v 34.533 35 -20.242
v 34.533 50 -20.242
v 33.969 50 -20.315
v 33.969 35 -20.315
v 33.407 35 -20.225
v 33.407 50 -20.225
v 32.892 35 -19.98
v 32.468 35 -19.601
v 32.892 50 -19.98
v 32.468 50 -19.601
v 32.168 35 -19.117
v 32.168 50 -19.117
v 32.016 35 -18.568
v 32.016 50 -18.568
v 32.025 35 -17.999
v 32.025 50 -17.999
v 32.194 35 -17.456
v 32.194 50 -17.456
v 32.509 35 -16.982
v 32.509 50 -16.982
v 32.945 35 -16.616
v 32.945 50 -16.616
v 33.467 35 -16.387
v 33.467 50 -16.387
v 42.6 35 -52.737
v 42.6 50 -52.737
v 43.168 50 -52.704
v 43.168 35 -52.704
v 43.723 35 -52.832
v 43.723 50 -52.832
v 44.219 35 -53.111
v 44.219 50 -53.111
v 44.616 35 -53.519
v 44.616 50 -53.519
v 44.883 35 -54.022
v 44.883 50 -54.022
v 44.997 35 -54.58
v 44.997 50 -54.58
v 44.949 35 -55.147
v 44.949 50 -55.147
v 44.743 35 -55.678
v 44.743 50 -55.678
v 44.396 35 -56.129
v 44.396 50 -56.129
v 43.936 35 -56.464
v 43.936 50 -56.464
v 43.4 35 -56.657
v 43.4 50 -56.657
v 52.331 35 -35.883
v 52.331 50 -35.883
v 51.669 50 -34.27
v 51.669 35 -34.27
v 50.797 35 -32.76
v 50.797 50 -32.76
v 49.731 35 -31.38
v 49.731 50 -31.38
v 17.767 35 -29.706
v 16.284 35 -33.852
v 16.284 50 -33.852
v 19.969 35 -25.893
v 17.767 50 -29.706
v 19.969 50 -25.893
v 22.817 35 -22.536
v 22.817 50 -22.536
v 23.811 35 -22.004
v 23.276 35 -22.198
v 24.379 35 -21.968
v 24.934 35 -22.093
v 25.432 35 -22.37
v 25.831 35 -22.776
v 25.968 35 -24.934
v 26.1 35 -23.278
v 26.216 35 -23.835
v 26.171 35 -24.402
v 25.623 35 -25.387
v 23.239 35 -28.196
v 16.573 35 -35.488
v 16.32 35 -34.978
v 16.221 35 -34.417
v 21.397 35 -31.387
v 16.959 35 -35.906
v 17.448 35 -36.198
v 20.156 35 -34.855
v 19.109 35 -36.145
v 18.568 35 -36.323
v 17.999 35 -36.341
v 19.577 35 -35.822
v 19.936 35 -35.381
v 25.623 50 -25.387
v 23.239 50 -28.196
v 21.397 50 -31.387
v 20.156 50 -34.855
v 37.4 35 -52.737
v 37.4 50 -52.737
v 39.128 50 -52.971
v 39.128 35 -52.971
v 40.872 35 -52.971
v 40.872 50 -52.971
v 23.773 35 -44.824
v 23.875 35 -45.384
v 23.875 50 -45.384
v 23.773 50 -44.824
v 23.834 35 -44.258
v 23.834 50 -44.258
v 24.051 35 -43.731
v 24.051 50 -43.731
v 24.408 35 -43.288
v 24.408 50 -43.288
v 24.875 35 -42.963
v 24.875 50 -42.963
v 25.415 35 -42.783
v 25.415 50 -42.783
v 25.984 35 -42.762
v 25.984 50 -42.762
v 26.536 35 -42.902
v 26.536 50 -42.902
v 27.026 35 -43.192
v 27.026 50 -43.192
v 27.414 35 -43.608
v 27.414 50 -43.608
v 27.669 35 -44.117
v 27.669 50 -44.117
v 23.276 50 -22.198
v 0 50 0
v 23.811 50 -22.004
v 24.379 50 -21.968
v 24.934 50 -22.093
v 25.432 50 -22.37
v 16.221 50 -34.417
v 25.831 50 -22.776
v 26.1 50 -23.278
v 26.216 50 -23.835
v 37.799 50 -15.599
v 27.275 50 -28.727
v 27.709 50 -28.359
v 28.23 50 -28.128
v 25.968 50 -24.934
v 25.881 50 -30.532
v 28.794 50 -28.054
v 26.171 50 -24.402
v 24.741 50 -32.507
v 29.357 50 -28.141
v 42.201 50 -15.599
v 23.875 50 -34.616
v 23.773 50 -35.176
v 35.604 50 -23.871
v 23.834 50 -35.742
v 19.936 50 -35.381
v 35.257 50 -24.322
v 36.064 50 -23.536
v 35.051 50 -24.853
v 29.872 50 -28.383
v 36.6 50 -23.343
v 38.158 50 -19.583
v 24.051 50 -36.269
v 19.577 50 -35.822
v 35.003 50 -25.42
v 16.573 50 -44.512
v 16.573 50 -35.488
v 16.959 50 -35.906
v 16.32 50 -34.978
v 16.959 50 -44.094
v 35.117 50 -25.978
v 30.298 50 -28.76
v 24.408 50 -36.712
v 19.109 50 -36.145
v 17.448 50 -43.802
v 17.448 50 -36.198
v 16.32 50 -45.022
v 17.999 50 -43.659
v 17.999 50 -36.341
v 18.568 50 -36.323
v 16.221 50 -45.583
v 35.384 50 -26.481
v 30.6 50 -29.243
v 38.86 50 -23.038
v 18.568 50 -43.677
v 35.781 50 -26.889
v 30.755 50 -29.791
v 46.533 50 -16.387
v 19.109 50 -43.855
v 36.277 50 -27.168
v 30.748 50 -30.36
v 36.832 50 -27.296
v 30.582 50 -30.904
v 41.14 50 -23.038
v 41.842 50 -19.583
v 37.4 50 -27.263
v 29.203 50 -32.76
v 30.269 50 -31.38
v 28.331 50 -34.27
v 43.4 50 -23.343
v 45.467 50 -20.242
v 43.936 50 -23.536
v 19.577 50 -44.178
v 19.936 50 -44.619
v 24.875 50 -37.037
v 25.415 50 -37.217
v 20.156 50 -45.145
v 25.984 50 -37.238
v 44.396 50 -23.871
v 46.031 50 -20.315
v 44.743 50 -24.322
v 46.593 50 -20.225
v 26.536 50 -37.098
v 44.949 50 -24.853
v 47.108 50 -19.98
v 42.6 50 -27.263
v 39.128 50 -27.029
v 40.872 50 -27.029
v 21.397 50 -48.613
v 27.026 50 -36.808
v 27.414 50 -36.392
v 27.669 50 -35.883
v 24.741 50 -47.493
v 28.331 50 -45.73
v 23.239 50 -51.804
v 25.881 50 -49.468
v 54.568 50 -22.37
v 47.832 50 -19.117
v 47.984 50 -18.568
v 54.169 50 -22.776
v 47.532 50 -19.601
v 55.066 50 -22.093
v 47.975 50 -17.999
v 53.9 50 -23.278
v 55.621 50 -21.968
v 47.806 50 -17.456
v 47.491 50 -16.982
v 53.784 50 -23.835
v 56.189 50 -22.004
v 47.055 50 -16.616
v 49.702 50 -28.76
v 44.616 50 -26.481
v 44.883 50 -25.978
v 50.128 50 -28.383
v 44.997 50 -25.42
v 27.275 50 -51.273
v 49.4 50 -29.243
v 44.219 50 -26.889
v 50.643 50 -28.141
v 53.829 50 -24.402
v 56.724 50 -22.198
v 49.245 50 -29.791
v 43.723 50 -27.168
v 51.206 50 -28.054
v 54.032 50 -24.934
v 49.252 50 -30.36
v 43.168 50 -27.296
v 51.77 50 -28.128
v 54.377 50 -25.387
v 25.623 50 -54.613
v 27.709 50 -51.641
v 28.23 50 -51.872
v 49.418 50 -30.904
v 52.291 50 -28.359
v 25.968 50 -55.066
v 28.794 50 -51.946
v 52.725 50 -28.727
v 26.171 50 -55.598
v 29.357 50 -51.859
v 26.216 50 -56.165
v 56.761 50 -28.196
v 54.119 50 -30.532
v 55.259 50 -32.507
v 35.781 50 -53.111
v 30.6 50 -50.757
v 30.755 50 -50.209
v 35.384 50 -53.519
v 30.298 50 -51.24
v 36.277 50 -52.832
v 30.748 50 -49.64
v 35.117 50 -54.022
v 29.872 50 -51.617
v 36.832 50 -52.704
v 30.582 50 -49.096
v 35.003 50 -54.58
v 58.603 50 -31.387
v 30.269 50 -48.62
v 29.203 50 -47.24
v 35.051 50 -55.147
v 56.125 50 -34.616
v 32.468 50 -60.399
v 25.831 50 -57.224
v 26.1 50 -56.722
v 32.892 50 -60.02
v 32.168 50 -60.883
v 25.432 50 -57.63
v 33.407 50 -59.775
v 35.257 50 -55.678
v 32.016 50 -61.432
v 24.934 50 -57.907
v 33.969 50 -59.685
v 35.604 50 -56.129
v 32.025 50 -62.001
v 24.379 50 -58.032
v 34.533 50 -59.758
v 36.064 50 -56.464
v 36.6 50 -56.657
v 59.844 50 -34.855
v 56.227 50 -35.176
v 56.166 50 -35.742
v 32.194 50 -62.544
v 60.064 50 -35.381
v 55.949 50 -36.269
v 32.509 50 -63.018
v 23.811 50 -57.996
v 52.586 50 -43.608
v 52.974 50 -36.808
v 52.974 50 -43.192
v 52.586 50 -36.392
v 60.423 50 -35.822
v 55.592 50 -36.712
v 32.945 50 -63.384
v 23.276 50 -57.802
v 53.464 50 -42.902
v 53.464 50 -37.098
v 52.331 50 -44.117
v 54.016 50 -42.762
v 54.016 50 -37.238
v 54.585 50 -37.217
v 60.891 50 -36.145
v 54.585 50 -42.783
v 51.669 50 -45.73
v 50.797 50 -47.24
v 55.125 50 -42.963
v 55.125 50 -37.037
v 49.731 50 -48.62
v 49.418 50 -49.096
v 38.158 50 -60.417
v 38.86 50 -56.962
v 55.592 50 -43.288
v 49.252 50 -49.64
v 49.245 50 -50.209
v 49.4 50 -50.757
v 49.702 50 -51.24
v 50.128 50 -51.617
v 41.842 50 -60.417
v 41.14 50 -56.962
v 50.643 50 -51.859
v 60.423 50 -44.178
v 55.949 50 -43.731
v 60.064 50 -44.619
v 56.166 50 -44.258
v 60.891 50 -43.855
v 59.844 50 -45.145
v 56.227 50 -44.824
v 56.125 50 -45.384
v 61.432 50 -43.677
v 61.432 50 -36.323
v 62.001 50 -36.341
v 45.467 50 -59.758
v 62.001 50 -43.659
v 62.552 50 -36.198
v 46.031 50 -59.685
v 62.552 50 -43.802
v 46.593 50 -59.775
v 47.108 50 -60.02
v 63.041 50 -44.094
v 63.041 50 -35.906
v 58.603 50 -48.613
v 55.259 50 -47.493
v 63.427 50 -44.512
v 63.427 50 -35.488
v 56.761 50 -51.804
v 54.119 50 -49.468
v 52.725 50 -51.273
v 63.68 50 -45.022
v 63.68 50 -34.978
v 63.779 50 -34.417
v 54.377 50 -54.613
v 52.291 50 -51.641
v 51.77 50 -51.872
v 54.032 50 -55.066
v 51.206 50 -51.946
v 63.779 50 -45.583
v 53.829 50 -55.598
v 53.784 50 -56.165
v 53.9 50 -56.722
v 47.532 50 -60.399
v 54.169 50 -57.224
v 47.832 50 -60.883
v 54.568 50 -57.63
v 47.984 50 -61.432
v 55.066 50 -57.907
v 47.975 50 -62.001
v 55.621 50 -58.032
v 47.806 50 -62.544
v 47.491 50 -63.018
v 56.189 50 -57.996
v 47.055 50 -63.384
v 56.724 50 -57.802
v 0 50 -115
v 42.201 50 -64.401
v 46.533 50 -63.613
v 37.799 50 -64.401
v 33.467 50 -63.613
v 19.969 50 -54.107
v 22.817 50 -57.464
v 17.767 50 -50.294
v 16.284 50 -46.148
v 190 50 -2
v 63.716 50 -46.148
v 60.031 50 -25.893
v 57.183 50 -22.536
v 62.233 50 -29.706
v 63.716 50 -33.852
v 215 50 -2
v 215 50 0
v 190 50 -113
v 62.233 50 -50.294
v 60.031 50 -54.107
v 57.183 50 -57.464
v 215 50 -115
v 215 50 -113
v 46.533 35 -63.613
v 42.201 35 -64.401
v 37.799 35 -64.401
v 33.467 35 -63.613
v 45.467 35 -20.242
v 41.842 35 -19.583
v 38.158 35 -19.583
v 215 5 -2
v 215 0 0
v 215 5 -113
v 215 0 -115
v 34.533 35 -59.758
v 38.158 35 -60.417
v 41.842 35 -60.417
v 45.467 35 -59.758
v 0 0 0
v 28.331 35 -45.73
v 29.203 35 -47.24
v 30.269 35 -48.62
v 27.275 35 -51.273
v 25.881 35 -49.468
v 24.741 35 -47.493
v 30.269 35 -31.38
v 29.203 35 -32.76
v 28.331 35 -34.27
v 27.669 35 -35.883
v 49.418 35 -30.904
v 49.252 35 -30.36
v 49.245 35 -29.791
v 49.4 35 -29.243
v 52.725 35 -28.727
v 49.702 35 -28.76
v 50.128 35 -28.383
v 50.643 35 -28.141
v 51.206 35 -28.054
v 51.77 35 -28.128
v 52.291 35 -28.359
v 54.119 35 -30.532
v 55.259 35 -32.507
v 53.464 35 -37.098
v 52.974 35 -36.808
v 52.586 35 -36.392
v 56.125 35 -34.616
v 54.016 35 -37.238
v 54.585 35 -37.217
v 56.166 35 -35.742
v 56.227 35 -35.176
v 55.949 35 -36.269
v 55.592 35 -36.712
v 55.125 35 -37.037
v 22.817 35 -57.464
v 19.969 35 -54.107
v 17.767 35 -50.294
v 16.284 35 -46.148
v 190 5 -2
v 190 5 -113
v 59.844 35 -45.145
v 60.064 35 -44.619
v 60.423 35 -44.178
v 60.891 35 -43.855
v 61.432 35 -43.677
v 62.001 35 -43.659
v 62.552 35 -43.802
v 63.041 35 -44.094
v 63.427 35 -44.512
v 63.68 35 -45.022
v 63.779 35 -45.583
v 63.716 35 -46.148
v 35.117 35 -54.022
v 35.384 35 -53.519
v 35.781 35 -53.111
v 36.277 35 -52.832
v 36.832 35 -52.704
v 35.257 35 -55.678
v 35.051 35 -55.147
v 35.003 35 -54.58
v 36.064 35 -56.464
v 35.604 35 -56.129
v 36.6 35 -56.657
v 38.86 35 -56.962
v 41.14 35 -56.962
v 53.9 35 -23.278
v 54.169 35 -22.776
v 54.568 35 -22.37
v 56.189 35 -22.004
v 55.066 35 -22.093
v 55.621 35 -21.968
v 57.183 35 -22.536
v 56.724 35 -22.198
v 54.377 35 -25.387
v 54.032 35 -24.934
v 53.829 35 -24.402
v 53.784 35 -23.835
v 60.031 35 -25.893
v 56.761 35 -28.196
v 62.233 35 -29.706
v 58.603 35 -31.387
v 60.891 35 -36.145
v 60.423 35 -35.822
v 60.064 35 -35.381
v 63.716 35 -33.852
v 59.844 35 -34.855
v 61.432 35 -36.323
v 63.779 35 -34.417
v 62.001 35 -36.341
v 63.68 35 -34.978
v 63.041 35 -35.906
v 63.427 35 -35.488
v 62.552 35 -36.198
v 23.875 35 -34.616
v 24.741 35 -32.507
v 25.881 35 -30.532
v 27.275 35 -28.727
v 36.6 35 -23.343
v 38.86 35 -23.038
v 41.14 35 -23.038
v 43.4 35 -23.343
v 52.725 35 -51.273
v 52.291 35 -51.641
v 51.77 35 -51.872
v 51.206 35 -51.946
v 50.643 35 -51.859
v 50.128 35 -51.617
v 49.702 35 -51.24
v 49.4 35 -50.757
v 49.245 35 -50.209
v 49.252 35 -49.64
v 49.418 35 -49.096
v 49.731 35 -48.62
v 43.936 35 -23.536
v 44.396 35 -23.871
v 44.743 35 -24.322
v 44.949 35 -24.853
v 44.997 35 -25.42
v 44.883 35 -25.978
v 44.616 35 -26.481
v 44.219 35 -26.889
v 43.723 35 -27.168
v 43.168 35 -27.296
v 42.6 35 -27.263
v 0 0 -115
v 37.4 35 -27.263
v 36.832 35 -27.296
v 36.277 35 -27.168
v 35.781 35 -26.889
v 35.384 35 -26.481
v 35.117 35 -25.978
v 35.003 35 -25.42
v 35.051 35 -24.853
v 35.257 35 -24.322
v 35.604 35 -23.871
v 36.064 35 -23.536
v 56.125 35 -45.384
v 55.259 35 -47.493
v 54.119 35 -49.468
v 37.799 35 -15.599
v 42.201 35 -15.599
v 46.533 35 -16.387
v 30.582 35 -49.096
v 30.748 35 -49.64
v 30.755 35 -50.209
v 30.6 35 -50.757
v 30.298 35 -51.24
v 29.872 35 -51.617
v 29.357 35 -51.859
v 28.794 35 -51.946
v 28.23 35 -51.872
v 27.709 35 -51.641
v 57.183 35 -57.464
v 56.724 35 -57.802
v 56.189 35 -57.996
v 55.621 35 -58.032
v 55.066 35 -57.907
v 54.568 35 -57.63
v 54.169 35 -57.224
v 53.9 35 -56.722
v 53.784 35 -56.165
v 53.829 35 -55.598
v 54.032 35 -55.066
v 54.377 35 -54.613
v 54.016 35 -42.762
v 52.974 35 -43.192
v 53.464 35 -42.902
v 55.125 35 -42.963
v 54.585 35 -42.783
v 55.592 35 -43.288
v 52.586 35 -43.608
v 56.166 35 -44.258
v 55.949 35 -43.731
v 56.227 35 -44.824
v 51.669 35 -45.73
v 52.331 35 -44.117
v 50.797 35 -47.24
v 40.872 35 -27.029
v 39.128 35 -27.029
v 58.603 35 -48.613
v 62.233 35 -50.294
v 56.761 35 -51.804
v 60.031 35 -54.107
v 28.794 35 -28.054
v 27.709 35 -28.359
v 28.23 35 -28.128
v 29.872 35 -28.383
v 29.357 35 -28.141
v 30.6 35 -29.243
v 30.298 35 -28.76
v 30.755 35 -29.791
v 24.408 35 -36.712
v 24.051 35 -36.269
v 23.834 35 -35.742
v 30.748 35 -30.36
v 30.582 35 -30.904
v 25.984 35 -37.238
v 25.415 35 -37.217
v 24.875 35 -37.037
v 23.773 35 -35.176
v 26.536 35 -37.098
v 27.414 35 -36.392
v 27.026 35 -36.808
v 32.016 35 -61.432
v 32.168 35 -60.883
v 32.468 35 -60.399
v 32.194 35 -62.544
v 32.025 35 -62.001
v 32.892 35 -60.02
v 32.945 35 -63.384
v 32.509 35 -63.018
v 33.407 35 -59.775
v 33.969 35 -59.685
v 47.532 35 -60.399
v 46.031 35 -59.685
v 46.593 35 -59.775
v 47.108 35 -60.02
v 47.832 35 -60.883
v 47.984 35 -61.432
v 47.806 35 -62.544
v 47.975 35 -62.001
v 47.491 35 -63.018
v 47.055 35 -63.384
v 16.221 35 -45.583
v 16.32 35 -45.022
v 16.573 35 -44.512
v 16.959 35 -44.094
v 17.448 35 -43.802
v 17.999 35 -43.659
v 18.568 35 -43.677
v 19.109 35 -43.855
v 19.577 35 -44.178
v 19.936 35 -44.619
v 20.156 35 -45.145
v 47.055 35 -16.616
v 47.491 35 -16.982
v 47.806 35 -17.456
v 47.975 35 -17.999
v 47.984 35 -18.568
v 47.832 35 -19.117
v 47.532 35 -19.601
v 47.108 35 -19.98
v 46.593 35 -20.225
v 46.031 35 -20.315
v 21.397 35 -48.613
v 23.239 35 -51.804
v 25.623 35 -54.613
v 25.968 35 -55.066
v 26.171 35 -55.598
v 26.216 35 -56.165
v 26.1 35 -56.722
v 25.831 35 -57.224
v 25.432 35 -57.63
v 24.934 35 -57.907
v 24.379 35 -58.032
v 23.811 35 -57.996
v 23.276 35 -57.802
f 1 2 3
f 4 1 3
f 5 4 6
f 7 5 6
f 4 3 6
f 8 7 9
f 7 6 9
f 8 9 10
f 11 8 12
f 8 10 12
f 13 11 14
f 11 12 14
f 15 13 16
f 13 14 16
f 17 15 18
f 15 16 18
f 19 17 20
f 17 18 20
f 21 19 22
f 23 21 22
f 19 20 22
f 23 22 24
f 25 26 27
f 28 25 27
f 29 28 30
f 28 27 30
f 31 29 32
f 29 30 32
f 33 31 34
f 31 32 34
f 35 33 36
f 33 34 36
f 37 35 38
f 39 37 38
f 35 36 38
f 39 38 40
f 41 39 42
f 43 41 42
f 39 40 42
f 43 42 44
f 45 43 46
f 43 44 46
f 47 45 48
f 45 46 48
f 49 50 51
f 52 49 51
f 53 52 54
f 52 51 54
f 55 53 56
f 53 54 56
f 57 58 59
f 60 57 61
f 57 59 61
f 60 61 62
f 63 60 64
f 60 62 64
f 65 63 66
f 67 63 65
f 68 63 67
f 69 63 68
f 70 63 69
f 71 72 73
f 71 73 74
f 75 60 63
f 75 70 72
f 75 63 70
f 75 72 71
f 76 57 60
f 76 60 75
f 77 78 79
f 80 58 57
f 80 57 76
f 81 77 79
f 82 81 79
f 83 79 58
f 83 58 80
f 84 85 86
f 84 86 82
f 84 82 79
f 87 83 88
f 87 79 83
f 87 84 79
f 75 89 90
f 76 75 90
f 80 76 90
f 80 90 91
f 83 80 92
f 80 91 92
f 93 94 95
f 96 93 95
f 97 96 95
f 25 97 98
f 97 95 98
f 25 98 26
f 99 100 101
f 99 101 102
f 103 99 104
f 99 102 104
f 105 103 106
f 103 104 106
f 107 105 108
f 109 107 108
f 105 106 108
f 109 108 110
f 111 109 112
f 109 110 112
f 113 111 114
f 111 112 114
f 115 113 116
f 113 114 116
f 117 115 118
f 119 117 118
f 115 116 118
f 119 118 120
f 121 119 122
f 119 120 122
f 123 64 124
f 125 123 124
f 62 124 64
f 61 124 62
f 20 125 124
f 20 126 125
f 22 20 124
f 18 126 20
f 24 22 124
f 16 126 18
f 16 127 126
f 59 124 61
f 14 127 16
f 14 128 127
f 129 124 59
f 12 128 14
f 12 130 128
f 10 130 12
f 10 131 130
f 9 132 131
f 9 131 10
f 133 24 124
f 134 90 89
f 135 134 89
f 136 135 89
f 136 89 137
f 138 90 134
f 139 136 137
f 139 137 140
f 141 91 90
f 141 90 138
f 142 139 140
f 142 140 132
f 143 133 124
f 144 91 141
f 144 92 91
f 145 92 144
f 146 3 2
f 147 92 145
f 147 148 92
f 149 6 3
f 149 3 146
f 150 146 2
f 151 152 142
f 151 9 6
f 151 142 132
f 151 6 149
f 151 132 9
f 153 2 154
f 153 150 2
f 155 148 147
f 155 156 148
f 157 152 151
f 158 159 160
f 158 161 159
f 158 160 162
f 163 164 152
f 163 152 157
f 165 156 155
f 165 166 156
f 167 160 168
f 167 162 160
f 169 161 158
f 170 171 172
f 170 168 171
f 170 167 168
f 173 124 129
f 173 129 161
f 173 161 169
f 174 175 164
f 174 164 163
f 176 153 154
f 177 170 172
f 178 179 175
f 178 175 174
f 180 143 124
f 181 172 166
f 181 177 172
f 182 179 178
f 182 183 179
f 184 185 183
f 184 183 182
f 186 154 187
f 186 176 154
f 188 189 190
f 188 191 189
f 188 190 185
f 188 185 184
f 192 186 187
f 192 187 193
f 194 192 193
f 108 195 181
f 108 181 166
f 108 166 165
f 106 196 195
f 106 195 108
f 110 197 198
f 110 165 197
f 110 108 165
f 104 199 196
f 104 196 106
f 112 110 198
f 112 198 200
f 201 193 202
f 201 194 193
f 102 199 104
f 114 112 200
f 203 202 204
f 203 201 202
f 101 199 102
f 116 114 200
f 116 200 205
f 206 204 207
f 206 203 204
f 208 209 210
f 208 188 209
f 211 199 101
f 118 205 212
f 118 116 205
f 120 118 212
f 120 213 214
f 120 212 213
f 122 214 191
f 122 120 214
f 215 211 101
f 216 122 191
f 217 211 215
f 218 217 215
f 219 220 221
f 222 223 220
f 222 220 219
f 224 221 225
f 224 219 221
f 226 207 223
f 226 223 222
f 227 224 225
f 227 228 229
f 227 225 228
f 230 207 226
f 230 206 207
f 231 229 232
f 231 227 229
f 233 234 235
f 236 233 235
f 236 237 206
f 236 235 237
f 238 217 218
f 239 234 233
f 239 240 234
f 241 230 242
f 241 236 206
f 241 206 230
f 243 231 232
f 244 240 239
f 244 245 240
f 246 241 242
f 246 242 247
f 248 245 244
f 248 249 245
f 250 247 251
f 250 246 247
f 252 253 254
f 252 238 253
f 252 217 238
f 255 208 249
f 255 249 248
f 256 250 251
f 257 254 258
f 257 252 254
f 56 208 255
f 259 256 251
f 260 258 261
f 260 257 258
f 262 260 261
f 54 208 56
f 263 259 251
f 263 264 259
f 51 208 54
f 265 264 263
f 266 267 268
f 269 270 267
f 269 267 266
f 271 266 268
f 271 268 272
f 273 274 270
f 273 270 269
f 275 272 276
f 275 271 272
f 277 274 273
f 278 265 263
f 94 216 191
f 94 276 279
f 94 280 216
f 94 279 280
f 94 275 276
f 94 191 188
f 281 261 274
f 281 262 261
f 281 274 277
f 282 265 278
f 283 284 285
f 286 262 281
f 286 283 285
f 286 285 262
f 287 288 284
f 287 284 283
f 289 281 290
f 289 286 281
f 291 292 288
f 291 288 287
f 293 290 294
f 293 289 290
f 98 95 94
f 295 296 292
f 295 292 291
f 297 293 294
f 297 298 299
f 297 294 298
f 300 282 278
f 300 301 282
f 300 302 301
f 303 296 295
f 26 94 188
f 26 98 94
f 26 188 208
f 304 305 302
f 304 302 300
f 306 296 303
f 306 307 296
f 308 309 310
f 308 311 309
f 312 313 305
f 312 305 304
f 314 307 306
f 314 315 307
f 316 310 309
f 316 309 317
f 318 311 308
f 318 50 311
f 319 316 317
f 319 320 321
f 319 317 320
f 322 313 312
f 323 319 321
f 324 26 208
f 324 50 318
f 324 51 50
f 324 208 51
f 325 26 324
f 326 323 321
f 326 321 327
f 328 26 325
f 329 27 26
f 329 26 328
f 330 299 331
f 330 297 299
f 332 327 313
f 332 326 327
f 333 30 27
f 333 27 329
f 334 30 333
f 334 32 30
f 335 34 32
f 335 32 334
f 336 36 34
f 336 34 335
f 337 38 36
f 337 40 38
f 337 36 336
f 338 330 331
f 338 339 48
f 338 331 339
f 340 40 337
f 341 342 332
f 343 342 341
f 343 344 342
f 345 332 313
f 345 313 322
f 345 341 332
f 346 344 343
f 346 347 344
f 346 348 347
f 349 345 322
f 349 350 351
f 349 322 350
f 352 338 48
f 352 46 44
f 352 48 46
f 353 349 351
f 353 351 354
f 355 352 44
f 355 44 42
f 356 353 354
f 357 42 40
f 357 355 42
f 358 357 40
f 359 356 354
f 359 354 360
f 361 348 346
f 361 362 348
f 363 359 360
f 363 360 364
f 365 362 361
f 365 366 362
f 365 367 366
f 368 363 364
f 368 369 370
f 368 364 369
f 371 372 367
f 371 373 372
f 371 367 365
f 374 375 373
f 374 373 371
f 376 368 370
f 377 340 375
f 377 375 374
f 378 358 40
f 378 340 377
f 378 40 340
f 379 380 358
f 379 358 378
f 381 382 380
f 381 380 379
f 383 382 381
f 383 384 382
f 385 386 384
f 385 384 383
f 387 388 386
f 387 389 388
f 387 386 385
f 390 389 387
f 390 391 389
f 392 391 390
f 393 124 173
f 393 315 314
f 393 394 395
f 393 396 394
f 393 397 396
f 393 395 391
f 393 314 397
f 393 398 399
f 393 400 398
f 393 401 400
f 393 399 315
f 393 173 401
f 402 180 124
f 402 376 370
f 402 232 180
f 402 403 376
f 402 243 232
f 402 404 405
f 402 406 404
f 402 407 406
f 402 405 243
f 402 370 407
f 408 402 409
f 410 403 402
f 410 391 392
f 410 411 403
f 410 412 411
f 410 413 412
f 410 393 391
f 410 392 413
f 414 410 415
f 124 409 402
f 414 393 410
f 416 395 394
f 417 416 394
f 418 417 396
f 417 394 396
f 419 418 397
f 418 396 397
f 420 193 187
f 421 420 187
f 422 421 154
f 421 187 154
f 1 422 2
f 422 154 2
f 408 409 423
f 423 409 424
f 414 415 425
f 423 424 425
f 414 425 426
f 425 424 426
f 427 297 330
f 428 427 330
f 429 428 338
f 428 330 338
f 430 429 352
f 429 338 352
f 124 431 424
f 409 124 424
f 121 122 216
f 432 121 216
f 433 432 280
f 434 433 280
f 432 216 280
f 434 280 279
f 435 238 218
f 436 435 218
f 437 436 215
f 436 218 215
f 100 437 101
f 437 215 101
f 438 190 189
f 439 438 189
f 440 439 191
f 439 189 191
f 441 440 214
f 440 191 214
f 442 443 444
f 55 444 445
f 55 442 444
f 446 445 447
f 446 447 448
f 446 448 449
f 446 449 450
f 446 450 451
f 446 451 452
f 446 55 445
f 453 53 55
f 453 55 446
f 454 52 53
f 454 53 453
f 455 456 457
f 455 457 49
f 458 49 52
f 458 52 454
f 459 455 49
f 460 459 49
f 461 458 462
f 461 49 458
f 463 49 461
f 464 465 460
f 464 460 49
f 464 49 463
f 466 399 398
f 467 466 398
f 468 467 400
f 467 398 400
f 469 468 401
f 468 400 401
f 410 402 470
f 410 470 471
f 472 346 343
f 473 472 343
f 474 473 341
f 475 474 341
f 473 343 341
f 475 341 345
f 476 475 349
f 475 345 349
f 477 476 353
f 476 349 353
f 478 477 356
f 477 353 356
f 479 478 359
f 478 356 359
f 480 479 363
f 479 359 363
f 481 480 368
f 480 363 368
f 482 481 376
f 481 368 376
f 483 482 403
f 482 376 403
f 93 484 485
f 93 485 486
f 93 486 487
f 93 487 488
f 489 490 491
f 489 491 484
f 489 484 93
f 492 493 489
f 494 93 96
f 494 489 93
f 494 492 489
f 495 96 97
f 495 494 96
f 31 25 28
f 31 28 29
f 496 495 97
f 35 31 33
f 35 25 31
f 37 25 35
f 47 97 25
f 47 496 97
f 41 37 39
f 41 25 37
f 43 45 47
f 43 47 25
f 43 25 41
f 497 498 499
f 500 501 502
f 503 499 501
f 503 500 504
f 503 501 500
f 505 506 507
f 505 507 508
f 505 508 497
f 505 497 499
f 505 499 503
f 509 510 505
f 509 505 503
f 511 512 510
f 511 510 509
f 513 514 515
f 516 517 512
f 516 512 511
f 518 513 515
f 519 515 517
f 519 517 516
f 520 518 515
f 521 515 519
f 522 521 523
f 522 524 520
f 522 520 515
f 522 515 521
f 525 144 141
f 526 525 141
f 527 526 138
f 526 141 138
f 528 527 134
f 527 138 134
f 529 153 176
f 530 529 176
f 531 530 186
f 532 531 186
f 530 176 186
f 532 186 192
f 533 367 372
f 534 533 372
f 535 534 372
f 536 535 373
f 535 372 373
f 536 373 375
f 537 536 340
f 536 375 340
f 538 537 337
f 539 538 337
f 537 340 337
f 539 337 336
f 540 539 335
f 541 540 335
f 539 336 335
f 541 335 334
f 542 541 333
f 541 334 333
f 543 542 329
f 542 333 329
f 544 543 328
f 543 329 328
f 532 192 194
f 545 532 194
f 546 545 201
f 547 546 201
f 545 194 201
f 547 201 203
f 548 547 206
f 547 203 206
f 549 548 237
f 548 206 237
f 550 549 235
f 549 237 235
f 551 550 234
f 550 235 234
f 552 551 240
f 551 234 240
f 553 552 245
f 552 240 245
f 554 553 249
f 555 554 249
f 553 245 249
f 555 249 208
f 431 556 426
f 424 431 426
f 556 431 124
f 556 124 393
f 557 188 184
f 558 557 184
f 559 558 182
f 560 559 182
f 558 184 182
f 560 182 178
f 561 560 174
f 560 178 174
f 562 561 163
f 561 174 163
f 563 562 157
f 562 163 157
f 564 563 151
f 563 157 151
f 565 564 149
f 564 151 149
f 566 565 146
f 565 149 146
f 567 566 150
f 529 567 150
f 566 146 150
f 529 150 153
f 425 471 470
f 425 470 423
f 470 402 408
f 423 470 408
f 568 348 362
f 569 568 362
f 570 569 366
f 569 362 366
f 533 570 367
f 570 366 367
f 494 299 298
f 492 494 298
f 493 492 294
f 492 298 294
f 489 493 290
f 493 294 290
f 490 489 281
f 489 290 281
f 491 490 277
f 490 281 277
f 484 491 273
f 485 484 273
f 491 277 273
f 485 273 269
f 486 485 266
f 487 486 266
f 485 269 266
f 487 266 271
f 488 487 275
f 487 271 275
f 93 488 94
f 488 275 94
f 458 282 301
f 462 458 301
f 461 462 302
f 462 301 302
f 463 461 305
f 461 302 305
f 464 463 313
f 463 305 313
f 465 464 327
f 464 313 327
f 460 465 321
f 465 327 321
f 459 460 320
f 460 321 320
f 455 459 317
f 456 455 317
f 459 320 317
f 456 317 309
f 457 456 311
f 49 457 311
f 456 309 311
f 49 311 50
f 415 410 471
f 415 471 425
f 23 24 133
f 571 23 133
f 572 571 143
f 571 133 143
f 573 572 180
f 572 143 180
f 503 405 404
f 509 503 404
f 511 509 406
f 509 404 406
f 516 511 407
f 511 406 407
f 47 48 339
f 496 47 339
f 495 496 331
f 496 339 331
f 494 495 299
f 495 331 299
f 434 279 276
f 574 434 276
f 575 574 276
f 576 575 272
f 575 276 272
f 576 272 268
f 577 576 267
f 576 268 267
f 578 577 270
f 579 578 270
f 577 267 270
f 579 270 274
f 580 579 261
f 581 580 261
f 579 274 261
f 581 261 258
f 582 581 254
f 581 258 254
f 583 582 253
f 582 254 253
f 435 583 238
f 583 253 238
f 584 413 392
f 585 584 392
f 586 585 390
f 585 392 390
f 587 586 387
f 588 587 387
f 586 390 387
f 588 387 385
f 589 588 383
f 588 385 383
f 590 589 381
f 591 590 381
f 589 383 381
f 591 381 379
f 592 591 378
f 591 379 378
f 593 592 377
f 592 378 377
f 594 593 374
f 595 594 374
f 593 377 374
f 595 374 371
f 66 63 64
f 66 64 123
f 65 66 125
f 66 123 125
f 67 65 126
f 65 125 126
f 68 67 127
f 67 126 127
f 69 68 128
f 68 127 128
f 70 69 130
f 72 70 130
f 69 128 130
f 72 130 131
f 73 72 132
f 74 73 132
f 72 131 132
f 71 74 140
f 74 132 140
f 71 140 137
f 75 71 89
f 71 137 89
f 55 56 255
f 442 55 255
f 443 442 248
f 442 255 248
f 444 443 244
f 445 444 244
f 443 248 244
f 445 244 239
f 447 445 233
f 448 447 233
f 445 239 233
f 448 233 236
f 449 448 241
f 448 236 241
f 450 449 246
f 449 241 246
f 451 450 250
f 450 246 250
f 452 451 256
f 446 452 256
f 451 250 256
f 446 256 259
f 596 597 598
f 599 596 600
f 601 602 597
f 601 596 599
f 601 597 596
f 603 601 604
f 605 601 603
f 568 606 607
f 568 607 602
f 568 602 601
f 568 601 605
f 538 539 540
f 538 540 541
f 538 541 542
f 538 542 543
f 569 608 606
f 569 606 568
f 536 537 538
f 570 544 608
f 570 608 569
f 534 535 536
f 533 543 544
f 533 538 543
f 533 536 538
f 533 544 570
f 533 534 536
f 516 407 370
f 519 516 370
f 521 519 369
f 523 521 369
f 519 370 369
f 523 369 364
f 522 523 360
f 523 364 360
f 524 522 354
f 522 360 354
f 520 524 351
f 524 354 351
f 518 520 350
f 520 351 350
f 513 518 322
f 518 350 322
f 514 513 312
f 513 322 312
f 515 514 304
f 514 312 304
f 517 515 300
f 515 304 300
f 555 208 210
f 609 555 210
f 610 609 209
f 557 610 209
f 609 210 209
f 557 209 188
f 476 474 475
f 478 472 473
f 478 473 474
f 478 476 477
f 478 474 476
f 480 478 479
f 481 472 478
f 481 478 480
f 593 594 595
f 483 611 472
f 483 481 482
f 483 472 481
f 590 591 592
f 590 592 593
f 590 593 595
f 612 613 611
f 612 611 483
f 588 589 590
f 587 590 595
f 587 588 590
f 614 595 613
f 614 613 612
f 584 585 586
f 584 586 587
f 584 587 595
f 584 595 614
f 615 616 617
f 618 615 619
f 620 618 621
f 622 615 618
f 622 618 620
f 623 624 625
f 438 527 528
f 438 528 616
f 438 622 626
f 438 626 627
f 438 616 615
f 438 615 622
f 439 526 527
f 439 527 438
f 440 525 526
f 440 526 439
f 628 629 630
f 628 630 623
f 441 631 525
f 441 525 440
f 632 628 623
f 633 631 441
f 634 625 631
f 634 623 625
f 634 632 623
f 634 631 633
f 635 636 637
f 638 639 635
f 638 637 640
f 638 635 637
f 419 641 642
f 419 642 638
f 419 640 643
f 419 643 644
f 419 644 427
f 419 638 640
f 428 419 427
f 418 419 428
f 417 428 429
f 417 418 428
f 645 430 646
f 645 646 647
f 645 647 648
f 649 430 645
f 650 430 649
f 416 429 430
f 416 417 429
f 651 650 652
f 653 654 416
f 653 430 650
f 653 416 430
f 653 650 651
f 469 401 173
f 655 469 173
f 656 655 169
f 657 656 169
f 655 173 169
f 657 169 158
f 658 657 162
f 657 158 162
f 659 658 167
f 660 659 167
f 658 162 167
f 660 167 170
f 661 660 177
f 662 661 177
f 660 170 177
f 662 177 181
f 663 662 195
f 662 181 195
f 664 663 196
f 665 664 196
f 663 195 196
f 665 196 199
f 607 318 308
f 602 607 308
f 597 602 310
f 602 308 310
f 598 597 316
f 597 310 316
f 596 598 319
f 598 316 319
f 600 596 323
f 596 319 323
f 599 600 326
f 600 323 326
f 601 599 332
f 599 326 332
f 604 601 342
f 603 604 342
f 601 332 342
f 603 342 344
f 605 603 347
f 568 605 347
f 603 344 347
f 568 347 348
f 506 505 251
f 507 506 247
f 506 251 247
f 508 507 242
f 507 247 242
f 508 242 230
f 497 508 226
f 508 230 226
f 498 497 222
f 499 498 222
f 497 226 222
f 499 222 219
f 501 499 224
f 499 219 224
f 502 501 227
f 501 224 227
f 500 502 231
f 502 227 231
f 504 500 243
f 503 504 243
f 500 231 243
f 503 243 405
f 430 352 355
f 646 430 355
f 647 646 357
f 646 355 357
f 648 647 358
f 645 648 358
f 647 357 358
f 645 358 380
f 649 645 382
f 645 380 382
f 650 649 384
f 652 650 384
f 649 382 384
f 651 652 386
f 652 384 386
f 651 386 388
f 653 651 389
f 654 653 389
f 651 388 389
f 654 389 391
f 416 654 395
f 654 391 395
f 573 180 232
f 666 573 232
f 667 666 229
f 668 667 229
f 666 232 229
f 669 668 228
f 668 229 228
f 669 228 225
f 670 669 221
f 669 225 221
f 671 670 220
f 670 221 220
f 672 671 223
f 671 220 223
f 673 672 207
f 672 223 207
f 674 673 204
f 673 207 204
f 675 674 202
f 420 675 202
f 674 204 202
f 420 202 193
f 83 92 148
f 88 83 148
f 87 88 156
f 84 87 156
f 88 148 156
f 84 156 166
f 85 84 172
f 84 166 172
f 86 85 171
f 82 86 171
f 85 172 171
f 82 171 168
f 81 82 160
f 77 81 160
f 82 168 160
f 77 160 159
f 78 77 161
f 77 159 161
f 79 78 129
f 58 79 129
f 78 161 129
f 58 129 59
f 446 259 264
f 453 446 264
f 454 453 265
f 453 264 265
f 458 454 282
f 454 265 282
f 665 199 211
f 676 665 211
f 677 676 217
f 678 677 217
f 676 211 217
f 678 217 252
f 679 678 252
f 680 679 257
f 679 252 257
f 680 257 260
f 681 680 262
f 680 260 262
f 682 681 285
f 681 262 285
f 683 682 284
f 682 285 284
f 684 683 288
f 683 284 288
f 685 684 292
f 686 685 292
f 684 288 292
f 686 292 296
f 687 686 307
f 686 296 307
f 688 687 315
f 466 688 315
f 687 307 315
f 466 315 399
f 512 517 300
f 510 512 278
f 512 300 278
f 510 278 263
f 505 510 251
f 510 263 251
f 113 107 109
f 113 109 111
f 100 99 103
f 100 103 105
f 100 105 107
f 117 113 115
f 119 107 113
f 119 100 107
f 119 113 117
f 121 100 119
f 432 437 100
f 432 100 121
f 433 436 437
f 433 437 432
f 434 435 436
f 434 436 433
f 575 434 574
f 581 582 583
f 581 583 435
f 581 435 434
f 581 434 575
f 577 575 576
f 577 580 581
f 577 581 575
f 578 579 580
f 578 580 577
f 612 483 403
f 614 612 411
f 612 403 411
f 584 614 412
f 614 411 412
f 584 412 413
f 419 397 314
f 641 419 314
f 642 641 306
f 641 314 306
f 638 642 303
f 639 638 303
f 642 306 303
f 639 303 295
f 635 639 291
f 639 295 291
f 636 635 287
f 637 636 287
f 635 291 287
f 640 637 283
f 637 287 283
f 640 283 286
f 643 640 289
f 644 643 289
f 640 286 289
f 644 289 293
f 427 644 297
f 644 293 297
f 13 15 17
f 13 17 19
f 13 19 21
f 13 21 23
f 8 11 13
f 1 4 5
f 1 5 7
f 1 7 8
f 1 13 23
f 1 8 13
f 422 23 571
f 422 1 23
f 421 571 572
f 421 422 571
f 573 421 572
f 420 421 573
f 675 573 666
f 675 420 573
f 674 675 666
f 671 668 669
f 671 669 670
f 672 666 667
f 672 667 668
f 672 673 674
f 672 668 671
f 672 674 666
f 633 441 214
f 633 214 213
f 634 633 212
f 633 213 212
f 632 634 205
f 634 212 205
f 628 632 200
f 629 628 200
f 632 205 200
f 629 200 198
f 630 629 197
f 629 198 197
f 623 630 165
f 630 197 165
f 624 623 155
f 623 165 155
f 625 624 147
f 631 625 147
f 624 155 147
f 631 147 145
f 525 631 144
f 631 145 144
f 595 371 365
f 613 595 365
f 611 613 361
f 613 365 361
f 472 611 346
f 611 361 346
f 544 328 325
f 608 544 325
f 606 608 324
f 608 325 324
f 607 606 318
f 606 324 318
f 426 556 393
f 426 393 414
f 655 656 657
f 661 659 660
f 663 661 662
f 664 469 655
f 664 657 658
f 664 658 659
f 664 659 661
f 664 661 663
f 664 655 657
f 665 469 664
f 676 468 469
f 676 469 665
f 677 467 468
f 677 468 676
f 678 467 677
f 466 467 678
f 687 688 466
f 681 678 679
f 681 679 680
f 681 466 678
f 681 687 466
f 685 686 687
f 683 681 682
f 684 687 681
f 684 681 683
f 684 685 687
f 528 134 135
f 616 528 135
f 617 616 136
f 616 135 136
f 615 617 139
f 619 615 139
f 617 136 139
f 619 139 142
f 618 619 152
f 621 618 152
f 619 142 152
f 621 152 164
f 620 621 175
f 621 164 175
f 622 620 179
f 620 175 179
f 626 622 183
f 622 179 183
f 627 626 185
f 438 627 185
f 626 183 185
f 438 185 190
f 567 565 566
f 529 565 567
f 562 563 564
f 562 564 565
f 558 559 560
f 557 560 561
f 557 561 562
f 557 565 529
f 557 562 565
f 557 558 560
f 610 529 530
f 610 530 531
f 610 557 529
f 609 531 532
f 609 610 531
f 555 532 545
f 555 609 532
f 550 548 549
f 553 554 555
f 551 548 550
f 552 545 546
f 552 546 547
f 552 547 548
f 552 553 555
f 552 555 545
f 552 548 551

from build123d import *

# Parameters (mm, degrees)
SKETCH_1_W          = 215
SKETCH_1_H          = 115
EXTRUDE_1_DEPTH     = 50
SKETCH_2_W          = 25
SKETCH_2_H          = 111
CUT_EXTRUDE_1_DEPTH = 45
CUT_EXTRUDE_3_DEPTH = 15


with BuildPart() as part:
    # Эскиз1 → Бобышка-Вытянуть1 (new body)
    with BuildSketch(Plane(origin=(0, 0, 0), x_dir=(1, 0, 0), z_dir=(0, 1, 0))):
        with Locations((107.5, 57.5)):
            Rectangle(SKETCH_1_W, SKETCH_1_H)
    extrude(amount=EXTRUDE_1_DEPTH)

    # Эскиз2 → Вырез-Вытянуть1 (cut)
    with BuildSketch(Plane(origin=(0, 50, 0), x_dir=(1, 0, 0), z_dir=(0, 1, 0))):
        with Locations((202.5, 57.5)):
            Rectangle(SKETCH_2_W, SKETCH_2_H)
    extrude(amount=-CUT_EXTRUDE_1_DEPTH, mode=Mode.SUBTRACT)

    # Эскиз3 → Вырез-Вытянуть3 (cut)
    with BuildSketch(Plane(origin=(0, 50, 0), x_dir=(1, 0, 0), z_dir=(0, 1, 0))):
        with BuildLine():
            ThreePointArc((36.6, 23.343469749), (40, 23), (43.4, 23.343469749))
            ThreePointArc((43.4, 23.343469749), (44.959591794, 25.703061543), (42.6, 27.262653338))
            ThreePointArc((42.6, 27.262653338), (40, 27), (37.4, 27.262653338))
            ThreePointArc((37.4, 27.262653338), (35.040408206, 25.703061543), (36.6, 23.343469749))
        make_face()
        with BuildLine():
            ThreePointArc((23.875021664, 34.616221247), (25.277568136, 31.5), (27.275021664, 28.727248502))
            ThreePointArc((27.275021664, 28.727248502), (30.098283997, 28.556398285), (30.269134213, 31.379660619))
            ThreePointArc((30.269134213, 31.379660619), (28.741669751, 33.5), (27.669134213, 35.882992719))
            ThreePointArc((27.669134213, 35.882992719), (25.138692203, 37.146663258), (23.875021664, 34.616221247))
        make_face()
        with BuildLine():
            ThreePointArc((27.275021664, 51.272751498), (25.277568136, 48.5), (23.875021664, 45.383778753))
            ThreePointArc((23.875021664, 45.383778753), (25.138692203, 42.853336742), (27.669134213, 44.117007281))
            ThreePointArc((27.669134213, 44.117007281), (28.741669751, 46.5), (30.269134213, 48.620339381))
            ThreePointArc((30.269134213, 48.620339381), (30.098283997, 51.443601715), (27.275021664, 51.272751498))
        make_face()
        with BuildLine():
            ThreePointArc((43.4, 56.656530251), (40, 57), (36.6, 56.656530251))
            ThreePointArc((36.6, 56.656530251), (35.040408206, 54.296938457), (37.4, 52.737346662))
            ThreePointArc((37.4, 52.737346662), (40, 53), (42.6, 52.737346662))
            ThreePointArc((42.6, 52.737346662), (44.959591794, 54.296938457), (43.4, 56.656530251))
        make_face()
        with BuildLine():
            ThreePointArc((56.124978336, 45.383778753), (54.722431864, 48.5), (52.724978336, 51.272751498))
            ThreePointArc((52.724978336, 51.272751498), (49.901716003, 51.443601715), (49.730865787, 48.620339381))
            ThreePointArc((49.730865787, 48.620339381), (51.258330249, 46.5), (52.330865787, 44.117007281))
            ThreePointArc((52.330865787, 44.117007281), (54.861307797, 42.853336742), (56.124978336, 45.383778753))
        make_face()
        with BuildLine():
            ThreePointArc((52.724978336, 28.727248502), (54.722431864, 31.5), (56.124978336, 34.616221247))
            ThreePointArc((56.124978336, 34.616221247), (54.861307797, 37.146663258), (52.330865787, 35.882992719))
            ThreePointArc((52.330865787, 35.882992719), (51.258330249, 33.5), (49.730865787, 31.379660619))
            ThreePointArc((49.730865787, 31.379660619), (49.901716003, 28.556398285), (52.724978336, 28.727248502))
        make_face()
        with BuildLine():
            ThreePointArc((33.466666667, 16.387173918), (40, 15.5), (46.533333333, 16.387173918))
            ThreePointArc((46.533333333, 16.387173918), (47.927577639, 18.848084891), (45.466666667, 20.242329197))
            ThreePointArc((45.466666667, 20.242329197), (40, 19.5), (34.533333333, 20.242329197))
            ThreePointArc((34.533333333, 20.242329197), (32.072422361, 18.848084891), (33.466666667, 16.387173918))
        make_face()
        with BuildLine():
            ThreePointArc((16.284026092, 33.851619597), (18.782377607, 27.75), (22.817359425, 22.535554321))
            ThreePointArc((22.817359425, 22.535554321), (25.645692997, 22.558558819), (25.622688498, 25.386892391))
            ThreePointArc((25.622688498, 25.386892391), (22.246479222, 29.75), (20.156021832, 34.855436806))
            ThreePointArc((20.156021832, 34.855436806), (17.718115357, 36.289526072), (16.284026092, 33.851619597))
        make_face()
        with BuildLine():
            ThreePointArc((22.817359425, 57.464445679), (18.782377607, 52.25), (16.284026092, 46.148380403))
            ThreePointArc((16.284026092, 46.148380403), (17.718115357, 43.710473928), (20.156021832, 45.144563194))
            ThreePointArc((20.156021832, 45.144563194), (22.246479222, 50.25), (25.622688498, 54.613107609))
            ThreePointArc((25.622688498, 54.613107609), (25.645692997, 57.441441181), (22.817359425, 57.464445679))
        make_face()
        with BuildLine():
            ThreePointArc((46.533333333, 63.612826082), (40, 64.5), (33.466666667, 63.612826082))
            ThreePointArc((33.466666667, 63.612826082), (32.072422361, 61.151915109), (34.533333333, 59.757670803))
            ThreePointArc((34.533333333, 59.757670803), (40, 60.5), (45.466666667, 59.757670803))
            ThreePointArc((45.466666667, 59.757670803), (47.927577639, 61.151915109), (46.533333333, 63.612826082))
        make_face()
        with BuildLine():
            ThreePointArc((63.715973908, 46.148380403), (61.217622393, 52.25), (57.182640575, 57.464445679))
            ThreePointArc((57.182640575, 57.464445679), (54.354307003, 57.441441181), (54.377311502, 54.613107609))
            ThreePointArc((54.377311502, 54.613107609), (57.753520778, 50.25), (59.843978168, 45.144563194))
            ThreePointArc((59.843978168, 45.144563194), (62.281884643, 43.710473928), (63.715973908, 46.148380403))
        make_face()
        with BuildLine():
            ThreePointArc((57.182640575, 22.535554321), (61.217622393, 27.75), (63.715973908, 33.851619597))
            ThreePointArc((63.715973908, 33.851619597), (62.281884643, 36.289526072), (59.843978168, 34.855436806))
            ThreePointArc((59.843978168, 34.855436806), (57.753520778, 29.75), (54.377311502, 25.386892391))
            ThreePointArc((54.377311502, 25.386892391), (54.354307003, 22.558558819), (57.182640575, 22.535554321))
        make_face()
    extrude(amount=-CUT_EXTRUDE_3_DEPTH, mode=Mode.SUBTRACT)


solid = part.part
